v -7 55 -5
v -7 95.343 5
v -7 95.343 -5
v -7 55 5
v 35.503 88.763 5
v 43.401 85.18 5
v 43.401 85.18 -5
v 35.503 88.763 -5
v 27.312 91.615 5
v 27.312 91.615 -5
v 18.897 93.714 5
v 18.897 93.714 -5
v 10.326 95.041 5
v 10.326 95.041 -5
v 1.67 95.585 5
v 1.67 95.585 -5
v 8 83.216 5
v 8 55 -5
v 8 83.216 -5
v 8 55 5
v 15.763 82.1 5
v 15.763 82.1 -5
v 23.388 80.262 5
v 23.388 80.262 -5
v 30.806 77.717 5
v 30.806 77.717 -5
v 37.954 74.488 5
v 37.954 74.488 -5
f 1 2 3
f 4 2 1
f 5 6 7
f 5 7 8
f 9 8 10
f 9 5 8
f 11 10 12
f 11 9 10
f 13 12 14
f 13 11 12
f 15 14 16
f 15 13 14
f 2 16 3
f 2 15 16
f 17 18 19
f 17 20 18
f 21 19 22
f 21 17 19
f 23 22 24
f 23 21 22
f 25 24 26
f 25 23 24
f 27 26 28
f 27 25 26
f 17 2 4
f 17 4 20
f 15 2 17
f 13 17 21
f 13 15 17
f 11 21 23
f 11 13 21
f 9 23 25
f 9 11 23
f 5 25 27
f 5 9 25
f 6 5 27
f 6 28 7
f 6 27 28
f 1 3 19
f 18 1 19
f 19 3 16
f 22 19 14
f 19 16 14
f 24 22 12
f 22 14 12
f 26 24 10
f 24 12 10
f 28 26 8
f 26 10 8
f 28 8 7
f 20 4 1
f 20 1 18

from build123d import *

# Parameters (mm, degrees)
BOSS_EXTRUDE1_DEPTH = 5


with BuildPart() as part:
    # Sketch1 → Boss-Extrude1 (new body, symmetric)
    with BuildSketch(Plane.XY):
        with BuildLine():
            Line((37.953605778, 74.488145422), (43.401491775, 85.180223712))
            ThreePointArc((43.401491775, 85.180223712), (18.896814133, 93.713768549), (-7, 95.343379424))
            Line((-7, 95.343379424), (-7, 55))
            Line((-7, 55), (0, 55))
            Line((0, 55), (8, 55))
            Line((8, 55), (8, 83.216344548))
            ThreePointArc((8, 83.216344548), (23.387578669, 80.261953403), (37.953605778, 74.488145422))
        make_face()
    extrude(amount=BOSS_EXTRUDE1_DEPTH, both=True)


solid = part.part
